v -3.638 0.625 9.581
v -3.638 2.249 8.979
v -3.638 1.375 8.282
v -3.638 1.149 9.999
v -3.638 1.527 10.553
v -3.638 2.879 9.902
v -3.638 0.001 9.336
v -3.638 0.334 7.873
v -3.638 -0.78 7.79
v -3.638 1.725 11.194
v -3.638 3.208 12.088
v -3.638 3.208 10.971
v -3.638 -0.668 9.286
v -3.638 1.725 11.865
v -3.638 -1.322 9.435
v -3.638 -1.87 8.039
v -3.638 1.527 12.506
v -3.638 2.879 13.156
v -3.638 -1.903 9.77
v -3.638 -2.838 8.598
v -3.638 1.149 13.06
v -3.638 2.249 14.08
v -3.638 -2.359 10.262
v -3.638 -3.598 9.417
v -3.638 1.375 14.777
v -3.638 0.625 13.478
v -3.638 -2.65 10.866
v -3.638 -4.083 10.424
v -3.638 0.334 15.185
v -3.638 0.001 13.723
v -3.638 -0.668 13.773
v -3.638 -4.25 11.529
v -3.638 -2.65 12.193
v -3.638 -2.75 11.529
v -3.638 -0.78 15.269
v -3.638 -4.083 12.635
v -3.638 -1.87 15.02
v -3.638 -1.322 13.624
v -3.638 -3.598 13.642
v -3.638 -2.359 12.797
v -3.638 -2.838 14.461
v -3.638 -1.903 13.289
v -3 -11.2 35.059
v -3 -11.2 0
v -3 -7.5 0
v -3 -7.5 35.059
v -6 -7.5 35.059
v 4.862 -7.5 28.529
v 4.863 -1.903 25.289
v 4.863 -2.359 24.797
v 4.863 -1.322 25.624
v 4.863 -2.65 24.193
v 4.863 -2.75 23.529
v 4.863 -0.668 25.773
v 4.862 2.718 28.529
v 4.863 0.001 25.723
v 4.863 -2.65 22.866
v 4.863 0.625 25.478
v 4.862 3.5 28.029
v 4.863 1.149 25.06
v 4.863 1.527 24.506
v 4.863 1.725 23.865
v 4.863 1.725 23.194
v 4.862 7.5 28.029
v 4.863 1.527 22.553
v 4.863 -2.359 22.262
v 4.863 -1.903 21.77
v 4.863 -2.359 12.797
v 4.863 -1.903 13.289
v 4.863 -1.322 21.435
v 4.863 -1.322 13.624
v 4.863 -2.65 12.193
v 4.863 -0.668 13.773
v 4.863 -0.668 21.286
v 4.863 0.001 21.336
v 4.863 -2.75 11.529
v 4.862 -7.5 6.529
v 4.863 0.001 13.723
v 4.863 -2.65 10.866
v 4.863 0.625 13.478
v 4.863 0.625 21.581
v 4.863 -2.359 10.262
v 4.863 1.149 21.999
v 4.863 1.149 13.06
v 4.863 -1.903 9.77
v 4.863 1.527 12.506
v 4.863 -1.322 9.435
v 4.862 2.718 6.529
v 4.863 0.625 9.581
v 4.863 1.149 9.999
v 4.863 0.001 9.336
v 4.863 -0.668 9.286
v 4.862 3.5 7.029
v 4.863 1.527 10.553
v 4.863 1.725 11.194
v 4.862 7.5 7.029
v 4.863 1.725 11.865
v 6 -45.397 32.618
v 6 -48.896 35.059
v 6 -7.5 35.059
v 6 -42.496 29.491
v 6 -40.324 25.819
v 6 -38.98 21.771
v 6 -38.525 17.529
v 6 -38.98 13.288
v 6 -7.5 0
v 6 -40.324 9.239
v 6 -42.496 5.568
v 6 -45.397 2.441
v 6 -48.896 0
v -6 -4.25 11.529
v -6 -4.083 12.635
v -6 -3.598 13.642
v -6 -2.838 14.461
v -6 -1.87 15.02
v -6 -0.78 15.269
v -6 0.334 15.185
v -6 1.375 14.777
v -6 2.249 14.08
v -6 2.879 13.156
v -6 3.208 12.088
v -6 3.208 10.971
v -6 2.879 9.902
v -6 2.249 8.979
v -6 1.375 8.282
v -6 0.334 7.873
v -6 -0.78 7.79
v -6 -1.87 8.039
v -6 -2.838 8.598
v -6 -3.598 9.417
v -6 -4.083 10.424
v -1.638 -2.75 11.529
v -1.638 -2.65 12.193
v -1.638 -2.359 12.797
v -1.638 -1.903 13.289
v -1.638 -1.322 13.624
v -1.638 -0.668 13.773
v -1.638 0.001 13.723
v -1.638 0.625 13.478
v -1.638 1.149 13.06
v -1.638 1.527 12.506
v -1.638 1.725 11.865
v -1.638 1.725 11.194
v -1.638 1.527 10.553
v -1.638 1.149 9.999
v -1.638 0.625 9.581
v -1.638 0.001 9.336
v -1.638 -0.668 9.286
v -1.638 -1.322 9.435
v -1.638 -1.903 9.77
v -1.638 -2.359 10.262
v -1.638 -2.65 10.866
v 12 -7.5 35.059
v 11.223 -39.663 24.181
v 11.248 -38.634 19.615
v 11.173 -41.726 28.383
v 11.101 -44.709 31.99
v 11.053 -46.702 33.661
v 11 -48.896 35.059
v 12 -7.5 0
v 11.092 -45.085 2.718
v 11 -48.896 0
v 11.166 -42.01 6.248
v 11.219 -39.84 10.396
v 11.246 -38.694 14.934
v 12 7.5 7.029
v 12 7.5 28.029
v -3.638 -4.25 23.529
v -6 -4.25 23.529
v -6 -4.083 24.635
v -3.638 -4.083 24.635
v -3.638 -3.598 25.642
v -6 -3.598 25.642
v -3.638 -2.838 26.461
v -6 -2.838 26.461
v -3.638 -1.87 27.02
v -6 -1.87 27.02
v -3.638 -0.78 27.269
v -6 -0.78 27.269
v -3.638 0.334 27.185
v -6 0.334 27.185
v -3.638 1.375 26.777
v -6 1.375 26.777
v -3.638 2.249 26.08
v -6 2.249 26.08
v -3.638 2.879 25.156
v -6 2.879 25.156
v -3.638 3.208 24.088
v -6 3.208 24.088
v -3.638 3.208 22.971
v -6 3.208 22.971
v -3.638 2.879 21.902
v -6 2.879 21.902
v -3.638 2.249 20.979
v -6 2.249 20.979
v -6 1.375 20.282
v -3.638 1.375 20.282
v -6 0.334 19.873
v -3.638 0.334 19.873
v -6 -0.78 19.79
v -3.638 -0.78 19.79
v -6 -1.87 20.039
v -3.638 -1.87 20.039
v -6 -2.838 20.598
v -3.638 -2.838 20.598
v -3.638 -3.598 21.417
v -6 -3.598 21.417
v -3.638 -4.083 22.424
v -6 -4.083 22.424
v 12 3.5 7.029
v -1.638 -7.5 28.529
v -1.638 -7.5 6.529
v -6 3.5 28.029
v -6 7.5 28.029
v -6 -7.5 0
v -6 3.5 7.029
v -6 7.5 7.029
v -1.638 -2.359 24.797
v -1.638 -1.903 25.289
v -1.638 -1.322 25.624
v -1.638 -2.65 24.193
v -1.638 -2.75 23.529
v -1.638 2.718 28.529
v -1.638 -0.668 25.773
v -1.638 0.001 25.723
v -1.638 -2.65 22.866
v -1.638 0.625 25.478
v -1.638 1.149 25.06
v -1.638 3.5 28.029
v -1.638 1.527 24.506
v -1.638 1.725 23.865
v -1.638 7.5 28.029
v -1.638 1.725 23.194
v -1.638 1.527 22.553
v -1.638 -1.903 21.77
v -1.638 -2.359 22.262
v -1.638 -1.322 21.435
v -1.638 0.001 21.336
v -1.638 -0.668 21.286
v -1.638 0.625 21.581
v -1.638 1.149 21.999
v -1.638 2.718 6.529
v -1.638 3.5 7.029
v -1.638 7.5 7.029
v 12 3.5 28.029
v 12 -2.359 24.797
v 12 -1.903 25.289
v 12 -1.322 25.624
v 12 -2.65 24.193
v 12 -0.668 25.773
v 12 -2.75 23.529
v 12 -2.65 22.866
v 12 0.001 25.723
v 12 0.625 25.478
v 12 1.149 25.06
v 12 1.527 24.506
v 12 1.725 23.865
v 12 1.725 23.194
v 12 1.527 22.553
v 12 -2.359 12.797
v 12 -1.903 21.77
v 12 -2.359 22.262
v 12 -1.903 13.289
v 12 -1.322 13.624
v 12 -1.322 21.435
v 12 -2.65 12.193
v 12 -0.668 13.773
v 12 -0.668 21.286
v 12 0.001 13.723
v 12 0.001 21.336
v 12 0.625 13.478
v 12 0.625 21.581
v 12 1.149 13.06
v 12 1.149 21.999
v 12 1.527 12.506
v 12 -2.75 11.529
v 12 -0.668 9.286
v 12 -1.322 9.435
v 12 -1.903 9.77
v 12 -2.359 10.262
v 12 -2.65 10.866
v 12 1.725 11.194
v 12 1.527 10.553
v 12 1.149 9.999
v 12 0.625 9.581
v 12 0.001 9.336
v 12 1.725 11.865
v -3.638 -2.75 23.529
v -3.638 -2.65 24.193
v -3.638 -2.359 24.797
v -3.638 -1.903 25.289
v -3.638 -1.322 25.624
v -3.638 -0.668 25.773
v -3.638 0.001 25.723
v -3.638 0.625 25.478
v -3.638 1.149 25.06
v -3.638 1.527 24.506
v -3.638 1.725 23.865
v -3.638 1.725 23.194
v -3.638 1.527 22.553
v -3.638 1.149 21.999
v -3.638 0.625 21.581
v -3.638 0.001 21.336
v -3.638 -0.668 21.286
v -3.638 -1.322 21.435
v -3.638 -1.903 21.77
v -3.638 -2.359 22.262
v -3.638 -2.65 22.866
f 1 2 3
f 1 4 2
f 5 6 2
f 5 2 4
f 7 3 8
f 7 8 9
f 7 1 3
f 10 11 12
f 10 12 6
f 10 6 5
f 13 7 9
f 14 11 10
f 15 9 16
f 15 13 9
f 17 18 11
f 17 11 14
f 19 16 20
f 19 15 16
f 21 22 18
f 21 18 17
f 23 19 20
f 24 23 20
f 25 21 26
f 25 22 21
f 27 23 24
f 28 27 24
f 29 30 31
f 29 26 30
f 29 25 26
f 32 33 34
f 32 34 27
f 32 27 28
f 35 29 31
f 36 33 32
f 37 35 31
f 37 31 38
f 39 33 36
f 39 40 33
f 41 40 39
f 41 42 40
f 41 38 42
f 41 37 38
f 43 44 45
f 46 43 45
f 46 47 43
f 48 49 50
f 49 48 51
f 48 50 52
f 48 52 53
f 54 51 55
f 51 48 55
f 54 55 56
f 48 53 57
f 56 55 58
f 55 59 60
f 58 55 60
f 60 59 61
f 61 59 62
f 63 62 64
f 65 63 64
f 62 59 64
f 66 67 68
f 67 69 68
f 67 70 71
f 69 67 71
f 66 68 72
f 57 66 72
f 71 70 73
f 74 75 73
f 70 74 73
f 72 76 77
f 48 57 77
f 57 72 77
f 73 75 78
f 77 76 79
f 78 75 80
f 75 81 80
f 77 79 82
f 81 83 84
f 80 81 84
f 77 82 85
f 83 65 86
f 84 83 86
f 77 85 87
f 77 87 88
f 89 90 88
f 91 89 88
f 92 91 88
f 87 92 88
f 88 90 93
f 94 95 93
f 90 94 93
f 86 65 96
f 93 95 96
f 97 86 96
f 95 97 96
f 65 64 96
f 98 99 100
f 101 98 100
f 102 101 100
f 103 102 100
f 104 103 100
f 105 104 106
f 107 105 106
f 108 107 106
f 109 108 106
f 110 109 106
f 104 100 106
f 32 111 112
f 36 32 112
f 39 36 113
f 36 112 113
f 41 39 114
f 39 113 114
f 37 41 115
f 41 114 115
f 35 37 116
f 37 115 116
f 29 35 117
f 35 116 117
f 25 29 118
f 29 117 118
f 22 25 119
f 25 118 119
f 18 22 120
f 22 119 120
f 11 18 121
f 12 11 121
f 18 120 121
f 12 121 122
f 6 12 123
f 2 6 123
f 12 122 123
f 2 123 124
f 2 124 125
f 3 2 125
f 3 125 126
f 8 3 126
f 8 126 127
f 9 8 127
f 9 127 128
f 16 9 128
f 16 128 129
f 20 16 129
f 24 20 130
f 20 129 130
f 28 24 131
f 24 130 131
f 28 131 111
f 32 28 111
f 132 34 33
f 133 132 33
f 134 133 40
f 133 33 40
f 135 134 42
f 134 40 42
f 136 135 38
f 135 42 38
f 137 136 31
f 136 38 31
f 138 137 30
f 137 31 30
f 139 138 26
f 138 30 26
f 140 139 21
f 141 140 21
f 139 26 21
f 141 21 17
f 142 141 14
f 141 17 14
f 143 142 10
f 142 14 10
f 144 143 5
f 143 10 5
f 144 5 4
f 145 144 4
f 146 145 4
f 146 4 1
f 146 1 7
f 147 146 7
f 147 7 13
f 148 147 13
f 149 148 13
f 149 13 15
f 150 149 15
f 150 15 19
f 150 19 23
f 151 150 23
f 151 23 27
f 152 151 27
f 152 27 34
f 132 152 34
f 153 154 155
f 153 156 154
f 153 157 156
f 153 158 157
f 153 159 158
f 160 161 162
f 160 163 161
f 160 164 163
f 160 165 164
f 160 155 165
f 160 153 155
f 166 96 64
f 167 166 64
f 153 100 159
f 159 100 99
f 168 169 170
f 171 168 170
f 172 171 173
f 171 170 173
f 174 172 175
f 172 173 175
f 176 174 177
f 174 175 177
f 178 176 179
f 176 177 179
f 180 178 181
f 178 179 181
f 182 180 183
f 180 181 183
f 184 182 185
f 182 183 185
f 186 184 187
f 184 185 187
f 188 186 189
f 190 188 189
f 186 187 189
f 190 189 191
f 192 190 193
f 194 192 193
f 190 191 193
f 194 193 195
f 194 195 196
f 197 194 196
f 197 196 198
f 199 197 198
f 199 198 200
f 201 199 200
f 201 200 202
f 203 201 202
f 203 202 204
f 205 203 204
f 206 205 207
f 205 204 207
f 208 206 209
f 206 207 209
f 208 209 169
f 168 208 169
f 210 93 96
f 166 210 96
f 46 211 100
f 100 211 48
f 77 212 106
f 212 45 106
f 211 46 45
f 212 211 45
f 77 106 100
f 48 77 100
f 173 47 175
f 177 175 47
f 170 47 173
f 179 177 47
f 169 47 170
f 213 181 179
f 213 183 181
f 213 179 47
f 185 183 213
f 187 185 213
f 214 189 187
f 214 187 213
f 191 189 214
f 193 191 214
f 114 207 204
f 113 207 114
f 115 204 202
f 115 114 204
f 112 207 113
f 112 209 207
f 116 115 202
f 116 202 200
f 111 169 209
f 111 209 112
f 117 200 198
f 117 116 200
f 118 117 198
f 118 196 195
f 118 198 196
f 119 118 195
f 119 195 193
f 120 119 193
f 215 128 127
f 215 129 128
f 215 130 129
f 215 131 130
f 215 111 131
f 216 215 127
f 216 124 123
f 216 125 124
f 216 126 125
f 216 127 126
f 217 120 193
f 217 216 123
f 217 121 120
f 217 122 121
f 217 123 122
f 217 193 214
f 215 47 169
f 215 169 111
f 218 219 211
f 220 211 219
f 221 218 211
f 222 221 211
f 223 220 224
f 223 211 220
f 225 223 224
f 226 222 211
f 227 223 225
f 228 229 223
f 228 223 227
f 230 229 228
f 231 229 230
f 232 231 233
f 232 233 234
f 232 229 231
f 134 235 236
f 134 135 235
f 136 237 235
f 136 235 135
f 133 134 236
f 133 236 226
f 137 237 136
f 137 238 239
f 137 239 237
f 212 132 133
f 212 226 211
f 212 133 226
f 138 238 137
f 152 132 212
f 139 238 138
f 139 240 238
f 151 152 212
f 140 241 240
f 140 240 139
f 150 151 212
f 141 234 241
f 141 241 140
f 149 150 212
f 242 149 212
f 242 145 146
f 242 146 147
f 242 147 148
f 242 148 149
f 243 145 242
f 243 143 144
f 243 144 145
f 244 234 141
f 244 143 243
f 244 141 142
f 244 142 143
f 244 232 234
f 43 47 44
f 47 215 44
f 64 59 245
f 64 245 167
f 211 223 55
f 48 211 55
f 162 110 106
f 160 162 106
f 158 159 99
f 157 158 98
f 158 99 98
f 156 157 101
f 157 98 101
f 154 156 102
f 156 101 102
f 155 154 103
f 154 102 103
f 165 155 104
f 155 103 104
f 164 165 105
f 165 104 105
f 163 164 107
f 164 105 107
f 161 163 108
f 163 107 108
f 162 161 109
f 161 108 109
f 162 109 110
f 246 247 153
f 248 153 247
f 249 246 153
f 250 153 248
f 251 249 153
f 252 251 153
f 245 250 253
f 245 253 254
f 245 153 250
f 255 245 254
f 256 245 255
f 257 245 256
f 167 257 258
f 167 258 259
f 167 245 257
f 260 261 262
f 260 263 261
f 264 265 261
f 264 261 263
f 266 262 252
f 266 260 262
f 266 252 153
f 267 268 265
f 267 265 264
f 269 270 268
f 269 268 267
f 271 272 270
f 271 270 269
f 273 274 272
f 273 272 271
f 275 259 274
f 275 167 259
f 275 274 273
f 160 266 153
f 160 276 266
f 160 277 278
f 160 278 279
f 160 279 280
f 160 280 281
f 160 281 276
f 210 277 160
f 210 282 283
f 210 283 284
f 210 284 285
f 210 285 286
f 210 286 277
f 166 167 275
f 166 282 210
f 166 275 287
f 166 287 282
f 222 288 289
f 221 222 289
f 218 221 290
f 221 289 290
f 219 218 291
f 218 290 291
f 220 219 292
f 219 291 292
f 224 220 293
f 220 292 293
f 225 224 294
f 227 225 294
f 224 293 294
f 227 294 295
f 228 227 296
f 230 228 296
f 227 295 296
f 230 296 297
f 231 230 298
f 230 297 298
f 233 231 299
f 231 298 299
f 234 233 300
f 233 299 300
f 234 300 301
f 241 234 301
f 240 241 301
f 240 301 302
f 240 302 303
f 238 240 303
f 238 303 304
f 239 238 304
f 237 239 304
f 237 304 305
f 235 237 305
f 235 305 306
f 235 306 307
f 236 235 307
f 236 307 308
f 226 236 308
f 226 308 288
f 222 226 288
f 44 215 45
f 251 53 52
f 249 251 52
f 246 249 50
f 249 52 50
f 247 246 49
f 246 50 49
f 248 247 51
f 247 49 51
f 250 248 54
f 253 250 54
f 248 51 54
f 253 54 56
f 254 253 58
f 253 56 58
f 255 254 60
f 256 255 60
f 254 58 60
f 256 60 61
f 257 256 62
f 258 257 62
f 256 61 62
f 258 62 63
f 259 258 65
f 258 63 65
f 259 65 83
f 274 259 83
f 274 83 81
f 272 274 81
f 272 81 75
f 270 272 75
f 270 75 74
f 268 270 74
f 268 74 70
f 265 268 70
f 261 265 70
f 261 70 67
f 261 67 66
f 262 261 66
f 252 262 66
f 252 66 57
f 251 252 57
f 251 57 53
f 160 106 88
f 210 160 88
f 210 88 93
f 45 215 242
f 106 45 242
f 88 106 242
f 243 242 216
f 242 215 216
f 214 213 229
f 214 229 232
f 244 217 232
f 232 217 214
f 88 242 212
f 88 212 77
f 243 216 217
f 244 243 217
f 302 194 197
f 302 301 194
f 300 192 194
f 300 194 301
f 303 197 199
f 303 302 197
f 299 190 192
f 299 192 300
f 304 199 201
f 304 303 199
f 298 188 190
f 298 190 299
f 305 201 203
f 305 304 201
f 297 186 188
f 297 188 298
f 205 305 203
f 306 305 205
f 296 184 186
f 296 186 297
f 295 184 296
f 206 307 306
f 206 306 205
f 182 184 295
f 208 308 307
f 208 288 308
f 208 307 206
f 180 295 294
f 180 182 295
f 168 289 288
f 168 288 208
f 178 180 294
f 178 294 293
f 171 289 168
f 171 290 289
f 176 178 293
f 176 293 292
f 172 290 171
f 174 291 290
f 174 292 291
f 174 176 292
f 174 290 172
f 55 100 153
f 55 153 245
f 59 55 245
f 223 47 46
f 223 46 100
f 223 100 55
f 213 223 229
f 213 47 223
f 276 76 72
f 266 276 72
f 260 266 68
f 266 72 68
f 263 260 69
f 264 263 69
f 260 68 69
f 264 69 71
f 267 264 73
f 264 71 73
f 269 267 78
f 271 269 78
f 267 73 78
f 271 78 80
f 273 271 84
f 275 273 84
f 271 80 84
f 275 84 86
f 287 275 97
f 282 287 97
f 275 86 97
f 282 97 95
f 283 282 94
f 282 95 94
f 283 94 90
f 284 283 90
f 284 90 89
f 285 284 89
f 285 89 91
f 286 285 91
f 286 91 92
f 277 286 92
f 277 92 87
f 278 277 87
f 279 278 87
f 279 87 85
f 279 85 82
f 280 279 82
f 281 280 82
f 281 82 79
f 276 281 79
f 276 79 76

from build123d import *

# Parameters (mm, degrees)
GRIPPER_ATTACHMENT_BASE_SKETCH_W   = 12
GRIPPER_ATTACHMENT_BASE_SKETCH_H   = 15
GRIPPER_ATTACHMENT_BASE_DEPTH      = 35.0588586
THICKENER_BASE_DEPTH               = 6
THICKNESS_CUTOFF_SKETCH_W          = 51.475312709
THICKNESS_CUTOFF_SKETCH_H          = 66.937611181
THICKNESS_CUTOFF_DEPTH             = 63.622352222
EXCESS_MATERIAL_CUTOFF_DEPTH       = 530.479784495
EXCESS_MATERIAL_CUTOFF_DEPTH_BACK  = 530.479784495
FINGER_CAVITY_CUTOUT_SKETCH_W      = 6.5
FINGER_CAVITY_CUTOUT_SKETCH_H      = 22
FINGER_CAVITY_CUTOUT_DEPTH         = 15
SCREW_THROUGH_HOLES_SKETCH_R       = 2.25
SCREW_THROUGH_HOLES_DEPTH          = 63.800756824
SOCKET_RECESSES_SKETCH_R           = 3.75
SOCKET_RECESSES_DEPTH              = 2.3625
SHAPING_TO_ELECTRONICS_PLATE_DEPTH = 35.058859


with BuildPart() as part:
    # Gripper Attachment Base Sketch → Gripper Attachment Base (new body)
    with BuildSketch(Plane.XY):
        Rectangle(GRIPPER_ATTACHMENT_BASE_SKETCH_W, GRIPPER_ATTACHMENT_BASE_SKETCH_H)
    extrude(amount=GRIPPER_ATTACHMENT_BASE_DEPTH)

    # Thickener Base Sketch → Thickener Base (add)
    with BuildSketch(Plane(origin=(6, 0, 0), x_dir=(0, 0, -1), z_dir=(1, 0, 0))):
        with BuildLine():
            Line((0, 7.5), (-35.0588586, 7.5))
            Line((-35.0588586, 7.5), (-35.0588586, -48.8959251))
            ThreePointArc((-35.0588586, -48.8959251), (-17.5294293, -38.525001297), (0, -48.8959251))
            Line((0, -48.8959251), (0, 7.5))
        make_face()
    extrude(amount=THICKENER_BASE_DEPTH)

    # Thickness Cutoff Sketch → Thickness Cutoff (cut, through all)
    with BuildSketch(Plane(origin=(12.174072963, -0.29408868, 0), x_dir=(0, 0, -1), z_dir=(0.9997083481115524, -0.02414992165766464, 0))):
        with Locations((-17.603923241, -21.483184787)):
            Rectangle(THICKNESS_CUTOFF_SKETCH_W, THICKNESS_CUTOFF_SKETCH_H)
    extrude(amount=THICKNESS_CUTOFF_DEPTH, mode=Mode.SUBTRACT)

    # Excess Material Cutoff Sketch → Excess Material Cutoff (cut, two sides: drawn at the far end of the back side and taken through both)
    with BuildSketch(Plane(origin=(0, -520.681520523, 0), x_dir=(0, 0, 1), z_dir=(1, 0, 0)).offset(-EXCESS_MATERIAL_CUTOFF_DEPTH_BACK)):
        Polygon((7.0294293, -528.181520523), (0, -528.181520523), (0, -513.181520523), (7.0294293, -524.181520523), align=None)
        Polygon((28.0294293, -528.181520523), (35.0588586, -528.181520523), (35.0588586, -513.181520523), (28.0294293, -524.181520523), align=None)
    extrude(amount=EXCESS_MATERIAL_CUTOFF_DEPTH + EXCESS_MATERIAL_CUTOFF_DEPTH_BACK, mode=Mode.SUBTRACT)

    # Finger Cavity Cutout Sketch → Finger Cavity Cutout (cut)
    with BuildSketch(Plane(origin=(0, 7.5, 0), x_dir=(1, 0, 0), z_dir=(0, 1, 0))):
        with Locations((1.6125, -17.5294293)):
            Rectangle(FINGER_CAVITY_CUTOUT_SKETCH_W, FINGER_CAVITY_CUTOUT_SKETCH_H)
    extrude(amount=-FINGER_CAVITY_CUTOUT_DEPTH, mode=Mode.SUBTRACT)

    # Screw Through-Holes Sketch → Screw Through-Holes (cut, through all)
    with BuildSketch(Plane.ZY.offset(6)):
        with Locations(Location((11.5294293, -0.5, 0), (0, 0, 270))):
            Circle(SCREW_THROUGH_HOLES_SKETCH_R)
        with Locations(Location((23.5294293, -0.5, 0), (0, 0, 270))):
            Circle(SCREW_THROUGH_HOLES_SKETCH_R)
    extrude(amount=-SCREW_THROUGH_HOLES_DEPTH, mode=Mode.SUBTRACT)

    # Socket Recesses Sketch → Socket Recesses (cut)
    with BuildSketch(Plane.ZY.offset(6)):
        with Locations(Location((11.5294293, -0.5, 0), (0, 0, 270))):
            Circle(SOCKET_RECESSES_SKETCH_R)
        with Locations(Location((23.5294293, -0.5, 0), (0, 0, 270))):
            Circle(SOCKET_RECESSES_SKETCH_R)
    extrude(amount=-SOCKET_RECESSES_DEPTH, mode=Mode.SUBTRACT)

    # Shaping to Electronics Plate Sketch → Shaping to Electronics Plate (add, through all)
    with BuildSketch(Plane.XY):
        Polygon((-6, -7.5), (-3, -11.2), (-3, -7.5), align=None)
    extrude(amount=SHAPING_TO_ELECTRONICS_PLATE_DEPTH)


solid = part.part
